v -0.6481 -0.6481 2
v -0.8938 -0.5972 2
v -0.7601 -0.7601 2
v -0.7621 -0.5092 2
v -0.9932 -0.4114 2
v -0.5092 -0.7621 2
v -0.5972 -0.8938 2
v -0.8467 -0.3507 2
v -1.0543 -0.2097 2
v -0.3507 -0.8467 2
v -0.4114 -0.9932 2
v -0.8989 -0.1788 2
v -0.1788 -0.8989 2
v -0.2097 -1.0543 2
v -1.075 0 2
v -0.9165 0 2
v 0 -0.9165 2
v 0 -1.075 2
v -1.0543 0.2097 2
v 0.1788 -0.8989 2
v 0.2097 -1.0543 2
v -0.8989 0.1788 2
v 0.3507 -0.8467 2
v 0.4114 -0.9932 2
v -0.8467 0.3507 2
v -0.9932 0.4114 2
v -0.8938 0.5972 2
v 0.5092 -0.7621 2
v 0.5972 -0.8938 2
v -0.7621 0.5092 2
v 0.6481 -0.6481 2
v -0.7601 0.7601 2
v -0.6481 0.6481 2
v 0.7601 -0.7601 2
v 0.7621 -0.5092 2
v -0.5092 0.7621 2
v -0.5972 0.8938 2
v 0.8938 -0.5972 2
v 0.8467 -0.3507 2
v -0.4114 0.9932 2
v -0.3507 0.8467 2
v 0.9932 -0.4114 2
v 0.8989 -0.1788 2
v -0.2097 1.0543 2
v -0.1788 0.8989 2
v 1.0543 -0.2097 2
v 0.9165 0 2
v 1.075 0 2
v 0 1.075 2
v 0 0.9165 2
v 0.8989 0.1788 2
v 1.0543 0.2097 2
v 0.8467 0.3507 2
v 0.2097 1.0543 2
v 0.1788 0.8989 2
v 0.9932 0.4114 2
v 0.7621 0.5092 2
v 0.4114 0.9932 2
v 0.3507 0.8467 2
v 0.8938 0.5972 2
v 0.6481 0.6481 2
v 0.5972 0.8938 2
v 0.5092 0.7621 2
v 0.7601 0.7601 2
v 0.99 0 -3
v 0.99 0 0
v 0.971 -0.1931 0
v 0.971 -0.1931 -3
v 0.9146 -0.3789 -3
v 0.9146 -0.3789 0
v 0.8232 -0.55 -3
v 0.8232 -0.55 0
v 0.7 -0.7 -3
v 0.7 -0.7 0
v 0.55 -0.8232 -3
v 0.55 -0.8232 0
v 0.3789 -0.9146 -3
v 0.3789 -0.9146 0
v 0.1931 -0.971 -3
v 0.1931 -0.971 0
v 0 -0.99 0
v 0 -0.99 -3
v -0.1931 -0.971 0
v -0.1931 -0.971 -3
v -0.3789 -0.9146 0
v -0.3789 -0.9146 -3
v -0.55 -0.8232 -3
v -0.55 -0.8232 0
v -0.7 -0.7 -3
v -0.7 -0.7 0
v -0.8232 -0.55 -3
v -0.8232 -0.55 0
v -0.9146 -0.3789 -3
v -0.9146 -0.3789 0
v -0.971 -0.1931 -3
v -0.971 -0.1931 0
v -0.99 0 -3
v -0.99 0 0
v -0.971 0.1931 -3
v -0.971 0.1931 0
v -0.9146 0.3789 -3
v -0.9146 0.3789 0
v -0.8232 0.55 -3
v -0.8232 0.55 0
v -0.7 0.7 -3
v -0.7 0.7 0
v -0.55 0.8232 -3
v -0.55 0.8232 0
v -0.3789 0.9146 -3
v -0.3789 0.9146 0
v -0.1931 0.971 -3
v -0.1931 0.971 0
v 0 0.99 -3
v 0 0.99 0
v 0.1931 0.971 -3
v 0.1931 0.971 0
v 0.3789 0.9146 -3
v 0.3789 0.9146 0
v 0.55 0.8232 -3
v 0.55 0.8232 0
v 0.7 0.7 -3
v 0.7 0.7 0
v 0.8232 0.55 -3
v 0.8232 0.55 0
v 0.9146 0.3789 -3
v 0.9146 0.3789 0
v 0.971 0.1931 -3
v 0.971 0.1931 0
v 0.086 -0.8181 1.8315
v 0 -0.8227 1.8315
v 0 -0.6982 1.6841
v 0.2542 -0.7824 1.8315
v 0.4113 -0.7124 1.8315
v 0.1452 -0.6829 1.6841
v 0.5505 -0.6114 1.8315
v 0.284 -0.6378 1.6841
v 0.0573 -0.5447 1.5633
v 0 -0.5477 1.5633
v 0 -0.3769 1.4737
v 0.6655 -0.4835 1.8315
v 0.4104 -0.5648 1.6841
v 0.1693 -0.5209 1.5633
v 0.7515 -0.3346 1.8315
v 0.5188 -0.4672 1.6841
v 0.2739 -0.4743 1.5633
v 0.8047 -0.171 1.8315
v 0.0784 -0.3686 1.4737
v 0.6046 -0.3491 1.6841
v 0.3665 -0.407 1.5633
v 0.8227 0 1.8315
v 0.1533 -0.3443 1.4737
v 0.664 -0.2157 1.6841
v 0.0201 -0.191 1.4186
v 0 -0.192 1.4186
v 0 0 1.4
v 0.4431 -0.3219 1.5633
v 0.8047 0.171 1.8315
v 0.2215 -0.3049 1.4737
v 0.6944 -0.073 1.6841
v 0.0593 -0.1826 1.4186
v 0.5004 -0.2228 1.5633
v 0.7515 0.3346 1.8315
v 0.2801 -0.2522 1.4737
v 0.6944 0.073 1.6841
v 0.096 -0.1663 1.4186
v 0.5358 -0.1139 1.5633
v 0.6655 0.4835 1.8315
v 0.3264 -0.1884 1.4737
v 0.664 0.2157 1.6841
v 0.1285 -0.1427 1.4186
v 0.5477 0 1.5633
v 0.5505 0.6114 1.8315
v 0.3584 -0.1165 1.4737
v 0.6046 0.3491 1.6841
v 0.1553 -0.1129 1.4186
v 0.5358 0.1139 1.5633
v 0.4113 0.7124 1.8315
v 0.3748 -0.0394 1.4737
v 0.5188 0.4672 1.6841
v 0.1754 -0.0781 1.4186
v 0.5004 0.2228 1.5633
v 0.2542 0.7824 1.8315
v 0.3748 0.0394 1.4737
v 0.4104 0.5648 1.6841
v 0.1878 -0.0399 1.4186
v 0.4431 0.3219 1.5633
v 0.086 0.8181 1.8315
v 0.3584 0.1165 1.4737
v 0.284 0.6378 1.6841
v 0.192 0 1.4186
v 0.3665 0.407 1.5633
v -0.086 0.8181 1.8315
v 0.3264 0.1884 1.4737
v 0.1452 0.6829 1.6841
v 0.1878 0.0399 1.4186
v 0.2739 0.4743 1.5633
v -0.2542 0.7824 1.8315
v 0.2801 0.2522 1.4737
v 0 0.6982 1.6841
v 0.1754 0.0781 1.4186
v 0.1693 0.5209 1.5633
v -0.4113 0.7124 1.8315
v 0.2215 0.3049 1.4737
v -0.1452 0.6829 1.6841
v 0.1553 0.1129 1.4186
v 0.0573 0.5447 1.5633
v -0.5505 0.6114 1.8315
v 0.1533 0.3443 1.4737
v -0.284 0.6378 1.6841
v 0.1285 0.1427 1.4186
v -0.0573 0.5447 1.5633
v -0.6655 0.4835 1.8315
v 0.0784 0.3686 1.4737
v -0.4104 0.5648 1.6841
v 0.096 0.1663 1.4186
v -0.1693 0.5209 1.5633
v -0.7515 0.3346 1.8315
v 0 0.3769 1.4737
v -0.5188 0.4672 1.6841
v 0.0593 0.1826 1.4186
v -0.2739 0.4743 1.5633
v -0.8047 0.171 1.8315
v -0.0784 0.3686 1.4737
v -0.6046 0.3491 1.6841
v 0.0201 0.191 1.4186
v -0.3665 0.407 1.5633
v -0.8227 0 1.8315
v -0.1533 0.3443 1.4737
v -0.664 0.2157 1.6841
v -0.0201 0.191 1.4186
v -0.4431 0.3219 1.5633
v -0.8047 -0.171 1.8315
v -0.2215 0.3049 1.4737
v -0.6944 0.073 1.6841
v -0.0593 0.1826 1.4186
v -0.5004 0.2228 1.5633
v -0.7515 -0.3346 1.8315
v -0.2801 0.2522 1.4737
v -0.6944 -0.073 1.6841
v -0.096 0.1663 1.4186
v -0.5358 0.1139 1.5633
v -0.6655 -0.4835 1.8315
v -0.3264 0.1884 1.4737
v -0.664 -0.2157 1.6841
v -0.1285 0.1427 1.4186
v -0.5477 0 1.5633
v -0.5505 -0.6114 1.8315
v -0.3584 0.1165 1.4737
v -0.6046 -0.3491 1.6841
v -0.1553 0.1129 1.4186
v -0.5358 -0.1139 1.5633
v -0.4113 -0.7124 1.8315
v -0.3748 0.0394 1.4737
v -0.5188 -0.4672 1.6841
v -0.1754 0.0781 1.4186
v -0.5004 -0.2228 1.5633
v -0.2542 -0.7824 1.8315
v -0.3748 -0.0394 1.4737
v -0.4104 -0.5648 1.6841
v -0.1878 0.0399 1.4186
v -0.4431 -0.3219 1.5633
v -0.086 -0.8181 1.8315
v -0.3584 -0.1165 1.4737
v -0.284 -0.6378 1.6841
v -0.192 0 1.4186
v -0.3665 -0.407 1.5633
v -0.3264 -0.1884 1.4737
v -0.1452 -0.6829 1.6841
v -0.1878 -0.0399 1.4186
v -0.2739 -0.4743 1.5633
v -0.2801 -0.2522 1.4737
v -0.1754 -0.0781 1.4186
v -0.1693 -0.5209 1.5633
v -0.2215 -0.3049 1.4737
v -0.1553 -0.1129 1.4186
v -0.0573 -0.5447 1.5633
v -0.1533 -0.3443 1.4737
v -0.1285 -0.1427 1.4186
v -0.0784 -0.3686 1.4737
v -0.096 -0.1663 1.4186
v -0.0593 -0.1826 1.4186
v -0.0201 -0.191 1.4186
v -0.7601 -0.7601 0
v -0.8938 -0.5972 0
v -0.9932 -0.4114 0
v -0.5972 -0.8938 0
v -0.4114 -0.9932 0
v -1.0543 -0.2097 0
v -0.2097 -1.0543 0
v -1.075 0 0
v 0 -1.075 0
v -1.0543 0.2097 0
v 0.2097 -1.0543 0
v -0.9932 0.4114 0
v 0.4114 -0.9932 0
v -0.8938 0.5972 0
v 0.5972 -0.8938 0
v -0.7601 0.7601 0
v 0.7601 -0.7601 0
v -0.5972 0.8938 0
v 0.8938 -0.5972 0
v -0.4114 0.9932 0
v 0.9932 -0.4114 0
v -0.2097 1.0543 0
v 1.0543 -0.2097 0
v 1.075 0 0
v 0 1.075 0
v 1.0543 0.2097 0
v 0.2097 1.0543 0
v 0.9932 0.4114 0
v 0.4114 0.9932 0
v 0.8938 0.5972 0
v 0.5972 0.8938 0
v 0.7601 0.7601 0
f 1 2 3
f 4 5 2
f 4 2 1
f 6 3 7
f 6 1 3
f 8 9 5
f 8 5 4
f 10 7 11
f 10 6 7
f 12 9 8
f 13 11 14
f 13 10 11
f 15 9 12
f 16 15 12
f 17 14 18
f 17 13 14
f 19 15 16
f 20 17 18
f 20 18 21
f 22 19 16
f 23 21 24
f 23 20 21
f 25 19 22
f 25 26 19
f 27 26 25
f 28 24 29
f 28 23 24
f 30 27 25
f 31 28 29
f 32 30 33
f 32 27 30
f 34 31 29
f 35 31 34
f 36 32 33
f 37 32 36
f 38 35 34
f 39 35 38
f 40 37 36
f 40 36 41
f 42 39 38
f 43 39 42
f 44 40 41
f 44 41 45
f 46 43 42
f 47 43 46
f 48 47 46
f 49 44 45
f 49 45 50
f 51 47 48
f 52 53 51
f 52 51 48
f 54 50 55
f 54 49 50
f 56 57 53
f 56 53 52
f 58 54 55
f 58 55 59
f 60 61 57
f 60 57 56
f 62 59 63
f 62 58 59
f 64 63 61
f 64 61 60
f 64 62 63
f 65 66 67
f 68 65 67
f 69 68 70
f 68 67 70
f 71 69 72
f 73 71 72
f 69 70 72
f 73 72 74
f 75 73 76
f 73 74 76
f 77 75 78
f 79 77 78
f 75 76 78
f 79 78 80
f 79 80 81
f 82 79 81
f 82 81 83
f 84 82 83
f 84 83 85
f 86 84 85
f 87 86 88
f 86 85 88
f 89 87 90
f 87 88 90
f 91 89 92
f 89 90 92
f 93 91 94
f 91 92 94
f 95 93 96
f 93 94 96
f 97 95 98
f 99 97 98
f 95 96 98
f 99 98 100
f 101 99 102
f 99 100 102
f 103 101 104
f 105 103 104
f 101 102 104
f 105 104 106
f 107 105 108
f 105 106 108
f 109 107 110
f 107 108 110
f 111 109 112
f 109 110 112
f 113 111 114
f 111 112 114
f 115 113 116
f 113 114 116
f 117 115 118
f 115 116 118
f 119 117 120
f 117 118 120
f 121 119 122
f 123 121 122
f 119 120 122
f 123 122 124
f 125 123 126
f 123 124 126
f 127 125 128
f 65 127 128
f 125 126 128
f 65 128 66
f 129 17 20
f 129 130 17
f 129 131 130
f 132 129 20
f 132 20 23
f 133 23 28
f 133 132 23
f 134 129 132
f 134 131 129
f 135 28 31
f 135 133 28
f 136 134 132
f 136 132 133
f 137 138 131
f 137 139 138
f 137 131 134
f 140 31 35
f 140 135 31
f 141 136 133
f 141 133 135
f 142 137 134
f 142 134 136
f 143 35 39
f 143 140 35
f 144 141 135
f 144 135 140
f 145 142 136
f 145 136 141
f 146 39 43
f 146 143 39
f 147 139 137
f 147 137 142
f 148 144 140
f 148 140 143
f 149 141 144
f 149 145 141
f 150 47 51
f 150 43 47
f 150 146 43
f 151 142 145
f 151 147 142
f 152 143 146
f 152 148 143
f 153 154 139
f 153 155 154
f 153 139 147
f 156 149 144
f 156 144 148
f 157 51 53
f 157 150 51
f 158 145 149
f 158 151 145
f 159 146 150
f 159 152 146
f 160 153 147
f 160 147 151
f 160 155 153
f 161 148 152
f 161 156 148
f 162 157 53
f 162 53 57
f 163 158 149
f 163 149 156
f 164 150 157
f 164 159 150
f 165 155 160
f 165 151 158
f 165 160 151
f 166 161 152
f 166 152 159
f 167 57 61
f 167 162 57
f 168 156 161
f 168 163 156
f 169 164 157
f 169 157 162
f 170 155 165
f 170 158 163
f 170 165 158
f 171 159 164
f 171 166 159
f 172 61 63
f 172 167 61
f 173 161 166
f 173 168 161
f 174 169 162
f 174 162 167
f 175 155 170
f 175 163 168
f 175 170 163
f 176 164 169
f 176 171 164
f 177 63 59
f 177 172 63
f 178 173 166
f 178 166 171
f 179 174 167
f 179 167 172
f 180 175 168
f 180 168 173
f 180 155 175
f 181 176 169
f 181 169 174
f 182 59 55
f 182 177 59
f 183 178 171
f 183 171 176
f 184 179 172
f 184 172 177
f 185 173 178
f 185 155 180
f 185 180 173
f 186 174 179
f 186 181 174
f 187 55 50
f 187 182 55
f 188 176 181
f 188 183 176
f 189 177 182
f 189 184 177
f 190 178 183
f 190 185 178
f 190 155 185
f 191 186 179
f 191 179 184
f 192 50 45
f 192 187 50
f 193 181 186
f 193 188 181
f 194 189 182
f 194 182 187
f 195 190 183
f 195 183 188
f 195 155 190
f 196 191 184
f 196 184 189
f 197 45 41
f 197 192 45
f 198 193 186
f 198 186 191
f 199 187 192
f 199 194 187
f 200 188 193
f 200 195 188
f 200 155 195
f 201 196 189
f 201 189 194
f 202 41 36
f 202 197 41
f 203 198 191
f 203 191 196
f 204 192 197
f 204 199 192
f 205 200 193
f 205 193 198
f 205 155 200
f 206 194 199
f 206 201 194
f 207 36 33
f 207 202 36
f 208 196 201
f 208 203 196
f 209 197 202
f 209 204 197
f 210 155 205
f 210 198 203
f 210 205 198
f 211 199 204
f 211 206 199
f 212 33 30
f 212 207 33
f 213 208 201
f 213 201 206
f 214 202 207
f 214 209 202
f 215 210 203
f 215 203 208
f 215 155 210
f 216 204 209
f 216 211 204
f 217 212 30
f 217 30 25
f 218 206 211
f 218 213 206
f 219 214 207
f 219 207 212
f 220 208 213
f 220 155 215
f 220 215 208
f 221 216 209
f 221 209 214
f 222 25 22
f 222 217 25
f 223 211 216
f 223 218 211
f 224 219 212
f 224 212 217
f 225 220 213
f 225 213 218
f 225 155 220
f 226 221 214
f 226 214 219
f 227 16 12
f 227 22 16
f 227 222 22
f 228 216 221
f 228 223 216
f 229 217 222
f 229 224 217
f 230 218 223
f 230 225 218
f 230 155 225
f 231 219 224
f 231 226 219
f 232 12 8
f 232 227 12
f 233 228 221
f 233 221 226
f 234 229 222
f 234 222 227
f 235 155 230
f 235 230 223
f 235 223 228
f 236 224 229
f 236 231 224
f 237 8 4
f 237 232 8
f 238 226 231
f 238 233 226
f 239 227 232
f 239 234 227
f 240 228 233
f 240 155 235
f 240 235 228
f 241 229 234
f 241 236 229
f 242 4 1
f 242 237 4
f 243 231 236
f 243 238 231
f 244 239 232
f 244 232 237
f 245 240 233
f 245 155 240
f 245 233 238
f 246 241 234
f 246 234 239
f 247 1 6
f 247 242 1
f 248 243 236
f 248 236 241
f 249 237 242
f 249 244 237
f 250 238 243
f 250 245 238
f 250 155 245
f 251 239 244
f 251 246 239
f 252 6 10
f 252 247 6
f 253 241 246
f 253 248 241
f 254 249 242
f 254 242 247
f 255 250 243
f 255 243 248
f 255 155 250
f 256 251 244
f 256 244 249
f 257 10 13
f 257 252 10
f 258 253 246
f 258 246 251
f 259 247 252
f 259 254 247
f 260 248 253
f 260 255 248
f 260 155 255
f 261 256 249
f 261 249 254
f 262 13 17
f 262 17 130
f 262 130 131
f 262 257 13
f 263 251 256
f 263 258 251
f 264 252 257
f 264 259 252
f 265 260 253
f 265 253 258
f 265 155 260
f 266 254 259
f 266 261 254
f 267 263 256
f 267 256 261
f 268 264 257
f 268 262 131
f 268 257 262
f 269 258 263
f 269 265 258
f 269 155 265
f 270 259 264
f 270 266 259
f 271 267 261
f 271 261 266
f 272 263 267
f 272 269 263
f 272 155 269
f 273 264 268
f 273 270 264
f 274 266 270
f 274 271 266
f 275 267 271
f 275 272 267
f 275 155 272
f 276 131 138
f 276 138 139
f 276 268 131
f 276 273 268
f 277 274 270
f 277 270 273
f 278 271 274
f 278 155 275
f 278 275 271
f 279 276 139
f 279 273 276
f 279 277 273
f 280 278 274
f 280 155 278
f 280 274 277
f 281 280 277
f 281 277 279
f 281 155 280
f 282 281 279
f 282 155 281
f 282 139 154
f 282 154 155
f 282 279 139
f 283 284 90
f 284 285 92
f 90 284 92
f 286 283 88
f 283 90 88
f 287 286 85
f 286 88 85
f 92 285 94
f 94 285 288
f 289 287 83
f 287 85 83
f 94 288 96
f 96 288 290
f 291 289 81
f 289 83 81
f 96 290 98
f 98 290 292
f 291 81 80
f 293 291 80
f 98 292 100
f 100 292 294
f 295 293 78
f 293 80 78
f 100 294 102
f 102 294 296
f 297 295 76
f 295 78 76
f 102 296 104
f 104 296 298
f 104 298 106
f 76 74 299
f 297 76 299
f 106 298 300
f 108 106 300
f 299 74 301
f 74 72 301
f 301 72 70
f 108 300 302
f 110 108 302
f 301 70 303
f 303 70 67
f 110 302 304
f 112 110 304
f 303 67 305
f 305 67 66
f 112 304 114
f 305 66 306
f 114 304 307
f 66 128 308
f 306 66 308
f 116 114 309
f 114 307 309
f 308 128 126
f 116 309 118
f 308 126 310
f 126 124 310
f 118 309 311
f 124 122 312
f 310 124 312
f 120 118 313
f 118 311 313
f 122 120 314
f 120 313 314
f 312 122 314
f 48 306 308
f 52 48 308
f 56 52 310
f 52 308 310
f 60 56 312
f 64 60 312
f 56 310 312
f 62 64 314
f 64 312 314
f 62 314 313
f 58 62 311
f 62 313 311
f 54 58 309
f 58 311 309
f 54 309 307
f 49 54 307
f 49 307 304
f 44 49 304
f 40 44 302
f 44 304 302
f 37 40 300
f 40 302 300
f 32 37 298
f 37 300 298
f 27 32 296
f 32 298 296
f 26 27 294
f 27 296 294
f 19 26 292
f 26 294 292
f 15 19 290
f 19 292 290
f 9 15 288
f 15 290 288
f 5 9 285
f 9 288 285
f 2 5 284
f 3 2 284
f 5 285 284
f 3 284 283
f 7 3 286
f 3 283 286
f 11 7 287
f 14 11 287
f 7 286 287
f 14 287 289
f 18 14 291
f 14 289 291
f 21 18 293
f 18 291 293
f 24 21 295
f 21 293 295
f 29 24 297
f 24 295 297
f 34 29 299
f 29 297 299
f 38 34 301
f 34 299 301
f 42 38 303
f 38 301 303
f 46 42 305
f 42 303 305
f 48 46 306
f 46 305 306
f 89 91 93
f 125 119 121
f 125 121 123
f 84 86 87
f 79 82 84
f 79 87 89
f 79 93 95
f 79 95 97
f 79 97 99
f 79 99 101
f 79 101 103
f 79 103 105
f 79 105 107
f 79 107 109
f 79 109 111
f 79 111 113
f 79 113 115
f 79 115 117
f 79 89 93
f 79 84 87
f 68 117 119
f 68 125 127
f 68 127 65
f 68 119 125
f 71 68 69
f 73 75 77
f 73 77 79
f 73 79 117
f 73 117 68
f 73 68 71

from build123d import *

# Parameters (mm, degrees)
F0_R     = 1.075
F1_DEPTH = 2
F2_R     = 0.99
F3_DEPTH = 3


with BuildPart() as f1:
    # F0 (on Top) → F1 (new body)
    with BuildSketch(Plane.XY):
        Circle(F0_R)
    extrude(amount=F1_DEPTH)

    # F2 (on face) → F3 (join)
    with BuildSketch(Plane(origin=(0, 0, 0), x_dir=(1, 0, 0), z_dir=(0, 0, -1))):
        Circle(F2_R)
    extrude(amount=F3_DEPTH)

    # F4 (on Right) → F5 (revolve, cut)
    with BuildSketch(Plane.YZ):
        with BuildLine():
            Line((0, 1.4), (0, 3.4))
            ThreePointArc((0, 3.4), (-1, 2.4), (0, 1.4))
        make_face()
    revolve(axis=Axis((0, 0, 1.2), (0, 0, 1)), mode=Mode.SUBTRACT)


solid = f1.part
